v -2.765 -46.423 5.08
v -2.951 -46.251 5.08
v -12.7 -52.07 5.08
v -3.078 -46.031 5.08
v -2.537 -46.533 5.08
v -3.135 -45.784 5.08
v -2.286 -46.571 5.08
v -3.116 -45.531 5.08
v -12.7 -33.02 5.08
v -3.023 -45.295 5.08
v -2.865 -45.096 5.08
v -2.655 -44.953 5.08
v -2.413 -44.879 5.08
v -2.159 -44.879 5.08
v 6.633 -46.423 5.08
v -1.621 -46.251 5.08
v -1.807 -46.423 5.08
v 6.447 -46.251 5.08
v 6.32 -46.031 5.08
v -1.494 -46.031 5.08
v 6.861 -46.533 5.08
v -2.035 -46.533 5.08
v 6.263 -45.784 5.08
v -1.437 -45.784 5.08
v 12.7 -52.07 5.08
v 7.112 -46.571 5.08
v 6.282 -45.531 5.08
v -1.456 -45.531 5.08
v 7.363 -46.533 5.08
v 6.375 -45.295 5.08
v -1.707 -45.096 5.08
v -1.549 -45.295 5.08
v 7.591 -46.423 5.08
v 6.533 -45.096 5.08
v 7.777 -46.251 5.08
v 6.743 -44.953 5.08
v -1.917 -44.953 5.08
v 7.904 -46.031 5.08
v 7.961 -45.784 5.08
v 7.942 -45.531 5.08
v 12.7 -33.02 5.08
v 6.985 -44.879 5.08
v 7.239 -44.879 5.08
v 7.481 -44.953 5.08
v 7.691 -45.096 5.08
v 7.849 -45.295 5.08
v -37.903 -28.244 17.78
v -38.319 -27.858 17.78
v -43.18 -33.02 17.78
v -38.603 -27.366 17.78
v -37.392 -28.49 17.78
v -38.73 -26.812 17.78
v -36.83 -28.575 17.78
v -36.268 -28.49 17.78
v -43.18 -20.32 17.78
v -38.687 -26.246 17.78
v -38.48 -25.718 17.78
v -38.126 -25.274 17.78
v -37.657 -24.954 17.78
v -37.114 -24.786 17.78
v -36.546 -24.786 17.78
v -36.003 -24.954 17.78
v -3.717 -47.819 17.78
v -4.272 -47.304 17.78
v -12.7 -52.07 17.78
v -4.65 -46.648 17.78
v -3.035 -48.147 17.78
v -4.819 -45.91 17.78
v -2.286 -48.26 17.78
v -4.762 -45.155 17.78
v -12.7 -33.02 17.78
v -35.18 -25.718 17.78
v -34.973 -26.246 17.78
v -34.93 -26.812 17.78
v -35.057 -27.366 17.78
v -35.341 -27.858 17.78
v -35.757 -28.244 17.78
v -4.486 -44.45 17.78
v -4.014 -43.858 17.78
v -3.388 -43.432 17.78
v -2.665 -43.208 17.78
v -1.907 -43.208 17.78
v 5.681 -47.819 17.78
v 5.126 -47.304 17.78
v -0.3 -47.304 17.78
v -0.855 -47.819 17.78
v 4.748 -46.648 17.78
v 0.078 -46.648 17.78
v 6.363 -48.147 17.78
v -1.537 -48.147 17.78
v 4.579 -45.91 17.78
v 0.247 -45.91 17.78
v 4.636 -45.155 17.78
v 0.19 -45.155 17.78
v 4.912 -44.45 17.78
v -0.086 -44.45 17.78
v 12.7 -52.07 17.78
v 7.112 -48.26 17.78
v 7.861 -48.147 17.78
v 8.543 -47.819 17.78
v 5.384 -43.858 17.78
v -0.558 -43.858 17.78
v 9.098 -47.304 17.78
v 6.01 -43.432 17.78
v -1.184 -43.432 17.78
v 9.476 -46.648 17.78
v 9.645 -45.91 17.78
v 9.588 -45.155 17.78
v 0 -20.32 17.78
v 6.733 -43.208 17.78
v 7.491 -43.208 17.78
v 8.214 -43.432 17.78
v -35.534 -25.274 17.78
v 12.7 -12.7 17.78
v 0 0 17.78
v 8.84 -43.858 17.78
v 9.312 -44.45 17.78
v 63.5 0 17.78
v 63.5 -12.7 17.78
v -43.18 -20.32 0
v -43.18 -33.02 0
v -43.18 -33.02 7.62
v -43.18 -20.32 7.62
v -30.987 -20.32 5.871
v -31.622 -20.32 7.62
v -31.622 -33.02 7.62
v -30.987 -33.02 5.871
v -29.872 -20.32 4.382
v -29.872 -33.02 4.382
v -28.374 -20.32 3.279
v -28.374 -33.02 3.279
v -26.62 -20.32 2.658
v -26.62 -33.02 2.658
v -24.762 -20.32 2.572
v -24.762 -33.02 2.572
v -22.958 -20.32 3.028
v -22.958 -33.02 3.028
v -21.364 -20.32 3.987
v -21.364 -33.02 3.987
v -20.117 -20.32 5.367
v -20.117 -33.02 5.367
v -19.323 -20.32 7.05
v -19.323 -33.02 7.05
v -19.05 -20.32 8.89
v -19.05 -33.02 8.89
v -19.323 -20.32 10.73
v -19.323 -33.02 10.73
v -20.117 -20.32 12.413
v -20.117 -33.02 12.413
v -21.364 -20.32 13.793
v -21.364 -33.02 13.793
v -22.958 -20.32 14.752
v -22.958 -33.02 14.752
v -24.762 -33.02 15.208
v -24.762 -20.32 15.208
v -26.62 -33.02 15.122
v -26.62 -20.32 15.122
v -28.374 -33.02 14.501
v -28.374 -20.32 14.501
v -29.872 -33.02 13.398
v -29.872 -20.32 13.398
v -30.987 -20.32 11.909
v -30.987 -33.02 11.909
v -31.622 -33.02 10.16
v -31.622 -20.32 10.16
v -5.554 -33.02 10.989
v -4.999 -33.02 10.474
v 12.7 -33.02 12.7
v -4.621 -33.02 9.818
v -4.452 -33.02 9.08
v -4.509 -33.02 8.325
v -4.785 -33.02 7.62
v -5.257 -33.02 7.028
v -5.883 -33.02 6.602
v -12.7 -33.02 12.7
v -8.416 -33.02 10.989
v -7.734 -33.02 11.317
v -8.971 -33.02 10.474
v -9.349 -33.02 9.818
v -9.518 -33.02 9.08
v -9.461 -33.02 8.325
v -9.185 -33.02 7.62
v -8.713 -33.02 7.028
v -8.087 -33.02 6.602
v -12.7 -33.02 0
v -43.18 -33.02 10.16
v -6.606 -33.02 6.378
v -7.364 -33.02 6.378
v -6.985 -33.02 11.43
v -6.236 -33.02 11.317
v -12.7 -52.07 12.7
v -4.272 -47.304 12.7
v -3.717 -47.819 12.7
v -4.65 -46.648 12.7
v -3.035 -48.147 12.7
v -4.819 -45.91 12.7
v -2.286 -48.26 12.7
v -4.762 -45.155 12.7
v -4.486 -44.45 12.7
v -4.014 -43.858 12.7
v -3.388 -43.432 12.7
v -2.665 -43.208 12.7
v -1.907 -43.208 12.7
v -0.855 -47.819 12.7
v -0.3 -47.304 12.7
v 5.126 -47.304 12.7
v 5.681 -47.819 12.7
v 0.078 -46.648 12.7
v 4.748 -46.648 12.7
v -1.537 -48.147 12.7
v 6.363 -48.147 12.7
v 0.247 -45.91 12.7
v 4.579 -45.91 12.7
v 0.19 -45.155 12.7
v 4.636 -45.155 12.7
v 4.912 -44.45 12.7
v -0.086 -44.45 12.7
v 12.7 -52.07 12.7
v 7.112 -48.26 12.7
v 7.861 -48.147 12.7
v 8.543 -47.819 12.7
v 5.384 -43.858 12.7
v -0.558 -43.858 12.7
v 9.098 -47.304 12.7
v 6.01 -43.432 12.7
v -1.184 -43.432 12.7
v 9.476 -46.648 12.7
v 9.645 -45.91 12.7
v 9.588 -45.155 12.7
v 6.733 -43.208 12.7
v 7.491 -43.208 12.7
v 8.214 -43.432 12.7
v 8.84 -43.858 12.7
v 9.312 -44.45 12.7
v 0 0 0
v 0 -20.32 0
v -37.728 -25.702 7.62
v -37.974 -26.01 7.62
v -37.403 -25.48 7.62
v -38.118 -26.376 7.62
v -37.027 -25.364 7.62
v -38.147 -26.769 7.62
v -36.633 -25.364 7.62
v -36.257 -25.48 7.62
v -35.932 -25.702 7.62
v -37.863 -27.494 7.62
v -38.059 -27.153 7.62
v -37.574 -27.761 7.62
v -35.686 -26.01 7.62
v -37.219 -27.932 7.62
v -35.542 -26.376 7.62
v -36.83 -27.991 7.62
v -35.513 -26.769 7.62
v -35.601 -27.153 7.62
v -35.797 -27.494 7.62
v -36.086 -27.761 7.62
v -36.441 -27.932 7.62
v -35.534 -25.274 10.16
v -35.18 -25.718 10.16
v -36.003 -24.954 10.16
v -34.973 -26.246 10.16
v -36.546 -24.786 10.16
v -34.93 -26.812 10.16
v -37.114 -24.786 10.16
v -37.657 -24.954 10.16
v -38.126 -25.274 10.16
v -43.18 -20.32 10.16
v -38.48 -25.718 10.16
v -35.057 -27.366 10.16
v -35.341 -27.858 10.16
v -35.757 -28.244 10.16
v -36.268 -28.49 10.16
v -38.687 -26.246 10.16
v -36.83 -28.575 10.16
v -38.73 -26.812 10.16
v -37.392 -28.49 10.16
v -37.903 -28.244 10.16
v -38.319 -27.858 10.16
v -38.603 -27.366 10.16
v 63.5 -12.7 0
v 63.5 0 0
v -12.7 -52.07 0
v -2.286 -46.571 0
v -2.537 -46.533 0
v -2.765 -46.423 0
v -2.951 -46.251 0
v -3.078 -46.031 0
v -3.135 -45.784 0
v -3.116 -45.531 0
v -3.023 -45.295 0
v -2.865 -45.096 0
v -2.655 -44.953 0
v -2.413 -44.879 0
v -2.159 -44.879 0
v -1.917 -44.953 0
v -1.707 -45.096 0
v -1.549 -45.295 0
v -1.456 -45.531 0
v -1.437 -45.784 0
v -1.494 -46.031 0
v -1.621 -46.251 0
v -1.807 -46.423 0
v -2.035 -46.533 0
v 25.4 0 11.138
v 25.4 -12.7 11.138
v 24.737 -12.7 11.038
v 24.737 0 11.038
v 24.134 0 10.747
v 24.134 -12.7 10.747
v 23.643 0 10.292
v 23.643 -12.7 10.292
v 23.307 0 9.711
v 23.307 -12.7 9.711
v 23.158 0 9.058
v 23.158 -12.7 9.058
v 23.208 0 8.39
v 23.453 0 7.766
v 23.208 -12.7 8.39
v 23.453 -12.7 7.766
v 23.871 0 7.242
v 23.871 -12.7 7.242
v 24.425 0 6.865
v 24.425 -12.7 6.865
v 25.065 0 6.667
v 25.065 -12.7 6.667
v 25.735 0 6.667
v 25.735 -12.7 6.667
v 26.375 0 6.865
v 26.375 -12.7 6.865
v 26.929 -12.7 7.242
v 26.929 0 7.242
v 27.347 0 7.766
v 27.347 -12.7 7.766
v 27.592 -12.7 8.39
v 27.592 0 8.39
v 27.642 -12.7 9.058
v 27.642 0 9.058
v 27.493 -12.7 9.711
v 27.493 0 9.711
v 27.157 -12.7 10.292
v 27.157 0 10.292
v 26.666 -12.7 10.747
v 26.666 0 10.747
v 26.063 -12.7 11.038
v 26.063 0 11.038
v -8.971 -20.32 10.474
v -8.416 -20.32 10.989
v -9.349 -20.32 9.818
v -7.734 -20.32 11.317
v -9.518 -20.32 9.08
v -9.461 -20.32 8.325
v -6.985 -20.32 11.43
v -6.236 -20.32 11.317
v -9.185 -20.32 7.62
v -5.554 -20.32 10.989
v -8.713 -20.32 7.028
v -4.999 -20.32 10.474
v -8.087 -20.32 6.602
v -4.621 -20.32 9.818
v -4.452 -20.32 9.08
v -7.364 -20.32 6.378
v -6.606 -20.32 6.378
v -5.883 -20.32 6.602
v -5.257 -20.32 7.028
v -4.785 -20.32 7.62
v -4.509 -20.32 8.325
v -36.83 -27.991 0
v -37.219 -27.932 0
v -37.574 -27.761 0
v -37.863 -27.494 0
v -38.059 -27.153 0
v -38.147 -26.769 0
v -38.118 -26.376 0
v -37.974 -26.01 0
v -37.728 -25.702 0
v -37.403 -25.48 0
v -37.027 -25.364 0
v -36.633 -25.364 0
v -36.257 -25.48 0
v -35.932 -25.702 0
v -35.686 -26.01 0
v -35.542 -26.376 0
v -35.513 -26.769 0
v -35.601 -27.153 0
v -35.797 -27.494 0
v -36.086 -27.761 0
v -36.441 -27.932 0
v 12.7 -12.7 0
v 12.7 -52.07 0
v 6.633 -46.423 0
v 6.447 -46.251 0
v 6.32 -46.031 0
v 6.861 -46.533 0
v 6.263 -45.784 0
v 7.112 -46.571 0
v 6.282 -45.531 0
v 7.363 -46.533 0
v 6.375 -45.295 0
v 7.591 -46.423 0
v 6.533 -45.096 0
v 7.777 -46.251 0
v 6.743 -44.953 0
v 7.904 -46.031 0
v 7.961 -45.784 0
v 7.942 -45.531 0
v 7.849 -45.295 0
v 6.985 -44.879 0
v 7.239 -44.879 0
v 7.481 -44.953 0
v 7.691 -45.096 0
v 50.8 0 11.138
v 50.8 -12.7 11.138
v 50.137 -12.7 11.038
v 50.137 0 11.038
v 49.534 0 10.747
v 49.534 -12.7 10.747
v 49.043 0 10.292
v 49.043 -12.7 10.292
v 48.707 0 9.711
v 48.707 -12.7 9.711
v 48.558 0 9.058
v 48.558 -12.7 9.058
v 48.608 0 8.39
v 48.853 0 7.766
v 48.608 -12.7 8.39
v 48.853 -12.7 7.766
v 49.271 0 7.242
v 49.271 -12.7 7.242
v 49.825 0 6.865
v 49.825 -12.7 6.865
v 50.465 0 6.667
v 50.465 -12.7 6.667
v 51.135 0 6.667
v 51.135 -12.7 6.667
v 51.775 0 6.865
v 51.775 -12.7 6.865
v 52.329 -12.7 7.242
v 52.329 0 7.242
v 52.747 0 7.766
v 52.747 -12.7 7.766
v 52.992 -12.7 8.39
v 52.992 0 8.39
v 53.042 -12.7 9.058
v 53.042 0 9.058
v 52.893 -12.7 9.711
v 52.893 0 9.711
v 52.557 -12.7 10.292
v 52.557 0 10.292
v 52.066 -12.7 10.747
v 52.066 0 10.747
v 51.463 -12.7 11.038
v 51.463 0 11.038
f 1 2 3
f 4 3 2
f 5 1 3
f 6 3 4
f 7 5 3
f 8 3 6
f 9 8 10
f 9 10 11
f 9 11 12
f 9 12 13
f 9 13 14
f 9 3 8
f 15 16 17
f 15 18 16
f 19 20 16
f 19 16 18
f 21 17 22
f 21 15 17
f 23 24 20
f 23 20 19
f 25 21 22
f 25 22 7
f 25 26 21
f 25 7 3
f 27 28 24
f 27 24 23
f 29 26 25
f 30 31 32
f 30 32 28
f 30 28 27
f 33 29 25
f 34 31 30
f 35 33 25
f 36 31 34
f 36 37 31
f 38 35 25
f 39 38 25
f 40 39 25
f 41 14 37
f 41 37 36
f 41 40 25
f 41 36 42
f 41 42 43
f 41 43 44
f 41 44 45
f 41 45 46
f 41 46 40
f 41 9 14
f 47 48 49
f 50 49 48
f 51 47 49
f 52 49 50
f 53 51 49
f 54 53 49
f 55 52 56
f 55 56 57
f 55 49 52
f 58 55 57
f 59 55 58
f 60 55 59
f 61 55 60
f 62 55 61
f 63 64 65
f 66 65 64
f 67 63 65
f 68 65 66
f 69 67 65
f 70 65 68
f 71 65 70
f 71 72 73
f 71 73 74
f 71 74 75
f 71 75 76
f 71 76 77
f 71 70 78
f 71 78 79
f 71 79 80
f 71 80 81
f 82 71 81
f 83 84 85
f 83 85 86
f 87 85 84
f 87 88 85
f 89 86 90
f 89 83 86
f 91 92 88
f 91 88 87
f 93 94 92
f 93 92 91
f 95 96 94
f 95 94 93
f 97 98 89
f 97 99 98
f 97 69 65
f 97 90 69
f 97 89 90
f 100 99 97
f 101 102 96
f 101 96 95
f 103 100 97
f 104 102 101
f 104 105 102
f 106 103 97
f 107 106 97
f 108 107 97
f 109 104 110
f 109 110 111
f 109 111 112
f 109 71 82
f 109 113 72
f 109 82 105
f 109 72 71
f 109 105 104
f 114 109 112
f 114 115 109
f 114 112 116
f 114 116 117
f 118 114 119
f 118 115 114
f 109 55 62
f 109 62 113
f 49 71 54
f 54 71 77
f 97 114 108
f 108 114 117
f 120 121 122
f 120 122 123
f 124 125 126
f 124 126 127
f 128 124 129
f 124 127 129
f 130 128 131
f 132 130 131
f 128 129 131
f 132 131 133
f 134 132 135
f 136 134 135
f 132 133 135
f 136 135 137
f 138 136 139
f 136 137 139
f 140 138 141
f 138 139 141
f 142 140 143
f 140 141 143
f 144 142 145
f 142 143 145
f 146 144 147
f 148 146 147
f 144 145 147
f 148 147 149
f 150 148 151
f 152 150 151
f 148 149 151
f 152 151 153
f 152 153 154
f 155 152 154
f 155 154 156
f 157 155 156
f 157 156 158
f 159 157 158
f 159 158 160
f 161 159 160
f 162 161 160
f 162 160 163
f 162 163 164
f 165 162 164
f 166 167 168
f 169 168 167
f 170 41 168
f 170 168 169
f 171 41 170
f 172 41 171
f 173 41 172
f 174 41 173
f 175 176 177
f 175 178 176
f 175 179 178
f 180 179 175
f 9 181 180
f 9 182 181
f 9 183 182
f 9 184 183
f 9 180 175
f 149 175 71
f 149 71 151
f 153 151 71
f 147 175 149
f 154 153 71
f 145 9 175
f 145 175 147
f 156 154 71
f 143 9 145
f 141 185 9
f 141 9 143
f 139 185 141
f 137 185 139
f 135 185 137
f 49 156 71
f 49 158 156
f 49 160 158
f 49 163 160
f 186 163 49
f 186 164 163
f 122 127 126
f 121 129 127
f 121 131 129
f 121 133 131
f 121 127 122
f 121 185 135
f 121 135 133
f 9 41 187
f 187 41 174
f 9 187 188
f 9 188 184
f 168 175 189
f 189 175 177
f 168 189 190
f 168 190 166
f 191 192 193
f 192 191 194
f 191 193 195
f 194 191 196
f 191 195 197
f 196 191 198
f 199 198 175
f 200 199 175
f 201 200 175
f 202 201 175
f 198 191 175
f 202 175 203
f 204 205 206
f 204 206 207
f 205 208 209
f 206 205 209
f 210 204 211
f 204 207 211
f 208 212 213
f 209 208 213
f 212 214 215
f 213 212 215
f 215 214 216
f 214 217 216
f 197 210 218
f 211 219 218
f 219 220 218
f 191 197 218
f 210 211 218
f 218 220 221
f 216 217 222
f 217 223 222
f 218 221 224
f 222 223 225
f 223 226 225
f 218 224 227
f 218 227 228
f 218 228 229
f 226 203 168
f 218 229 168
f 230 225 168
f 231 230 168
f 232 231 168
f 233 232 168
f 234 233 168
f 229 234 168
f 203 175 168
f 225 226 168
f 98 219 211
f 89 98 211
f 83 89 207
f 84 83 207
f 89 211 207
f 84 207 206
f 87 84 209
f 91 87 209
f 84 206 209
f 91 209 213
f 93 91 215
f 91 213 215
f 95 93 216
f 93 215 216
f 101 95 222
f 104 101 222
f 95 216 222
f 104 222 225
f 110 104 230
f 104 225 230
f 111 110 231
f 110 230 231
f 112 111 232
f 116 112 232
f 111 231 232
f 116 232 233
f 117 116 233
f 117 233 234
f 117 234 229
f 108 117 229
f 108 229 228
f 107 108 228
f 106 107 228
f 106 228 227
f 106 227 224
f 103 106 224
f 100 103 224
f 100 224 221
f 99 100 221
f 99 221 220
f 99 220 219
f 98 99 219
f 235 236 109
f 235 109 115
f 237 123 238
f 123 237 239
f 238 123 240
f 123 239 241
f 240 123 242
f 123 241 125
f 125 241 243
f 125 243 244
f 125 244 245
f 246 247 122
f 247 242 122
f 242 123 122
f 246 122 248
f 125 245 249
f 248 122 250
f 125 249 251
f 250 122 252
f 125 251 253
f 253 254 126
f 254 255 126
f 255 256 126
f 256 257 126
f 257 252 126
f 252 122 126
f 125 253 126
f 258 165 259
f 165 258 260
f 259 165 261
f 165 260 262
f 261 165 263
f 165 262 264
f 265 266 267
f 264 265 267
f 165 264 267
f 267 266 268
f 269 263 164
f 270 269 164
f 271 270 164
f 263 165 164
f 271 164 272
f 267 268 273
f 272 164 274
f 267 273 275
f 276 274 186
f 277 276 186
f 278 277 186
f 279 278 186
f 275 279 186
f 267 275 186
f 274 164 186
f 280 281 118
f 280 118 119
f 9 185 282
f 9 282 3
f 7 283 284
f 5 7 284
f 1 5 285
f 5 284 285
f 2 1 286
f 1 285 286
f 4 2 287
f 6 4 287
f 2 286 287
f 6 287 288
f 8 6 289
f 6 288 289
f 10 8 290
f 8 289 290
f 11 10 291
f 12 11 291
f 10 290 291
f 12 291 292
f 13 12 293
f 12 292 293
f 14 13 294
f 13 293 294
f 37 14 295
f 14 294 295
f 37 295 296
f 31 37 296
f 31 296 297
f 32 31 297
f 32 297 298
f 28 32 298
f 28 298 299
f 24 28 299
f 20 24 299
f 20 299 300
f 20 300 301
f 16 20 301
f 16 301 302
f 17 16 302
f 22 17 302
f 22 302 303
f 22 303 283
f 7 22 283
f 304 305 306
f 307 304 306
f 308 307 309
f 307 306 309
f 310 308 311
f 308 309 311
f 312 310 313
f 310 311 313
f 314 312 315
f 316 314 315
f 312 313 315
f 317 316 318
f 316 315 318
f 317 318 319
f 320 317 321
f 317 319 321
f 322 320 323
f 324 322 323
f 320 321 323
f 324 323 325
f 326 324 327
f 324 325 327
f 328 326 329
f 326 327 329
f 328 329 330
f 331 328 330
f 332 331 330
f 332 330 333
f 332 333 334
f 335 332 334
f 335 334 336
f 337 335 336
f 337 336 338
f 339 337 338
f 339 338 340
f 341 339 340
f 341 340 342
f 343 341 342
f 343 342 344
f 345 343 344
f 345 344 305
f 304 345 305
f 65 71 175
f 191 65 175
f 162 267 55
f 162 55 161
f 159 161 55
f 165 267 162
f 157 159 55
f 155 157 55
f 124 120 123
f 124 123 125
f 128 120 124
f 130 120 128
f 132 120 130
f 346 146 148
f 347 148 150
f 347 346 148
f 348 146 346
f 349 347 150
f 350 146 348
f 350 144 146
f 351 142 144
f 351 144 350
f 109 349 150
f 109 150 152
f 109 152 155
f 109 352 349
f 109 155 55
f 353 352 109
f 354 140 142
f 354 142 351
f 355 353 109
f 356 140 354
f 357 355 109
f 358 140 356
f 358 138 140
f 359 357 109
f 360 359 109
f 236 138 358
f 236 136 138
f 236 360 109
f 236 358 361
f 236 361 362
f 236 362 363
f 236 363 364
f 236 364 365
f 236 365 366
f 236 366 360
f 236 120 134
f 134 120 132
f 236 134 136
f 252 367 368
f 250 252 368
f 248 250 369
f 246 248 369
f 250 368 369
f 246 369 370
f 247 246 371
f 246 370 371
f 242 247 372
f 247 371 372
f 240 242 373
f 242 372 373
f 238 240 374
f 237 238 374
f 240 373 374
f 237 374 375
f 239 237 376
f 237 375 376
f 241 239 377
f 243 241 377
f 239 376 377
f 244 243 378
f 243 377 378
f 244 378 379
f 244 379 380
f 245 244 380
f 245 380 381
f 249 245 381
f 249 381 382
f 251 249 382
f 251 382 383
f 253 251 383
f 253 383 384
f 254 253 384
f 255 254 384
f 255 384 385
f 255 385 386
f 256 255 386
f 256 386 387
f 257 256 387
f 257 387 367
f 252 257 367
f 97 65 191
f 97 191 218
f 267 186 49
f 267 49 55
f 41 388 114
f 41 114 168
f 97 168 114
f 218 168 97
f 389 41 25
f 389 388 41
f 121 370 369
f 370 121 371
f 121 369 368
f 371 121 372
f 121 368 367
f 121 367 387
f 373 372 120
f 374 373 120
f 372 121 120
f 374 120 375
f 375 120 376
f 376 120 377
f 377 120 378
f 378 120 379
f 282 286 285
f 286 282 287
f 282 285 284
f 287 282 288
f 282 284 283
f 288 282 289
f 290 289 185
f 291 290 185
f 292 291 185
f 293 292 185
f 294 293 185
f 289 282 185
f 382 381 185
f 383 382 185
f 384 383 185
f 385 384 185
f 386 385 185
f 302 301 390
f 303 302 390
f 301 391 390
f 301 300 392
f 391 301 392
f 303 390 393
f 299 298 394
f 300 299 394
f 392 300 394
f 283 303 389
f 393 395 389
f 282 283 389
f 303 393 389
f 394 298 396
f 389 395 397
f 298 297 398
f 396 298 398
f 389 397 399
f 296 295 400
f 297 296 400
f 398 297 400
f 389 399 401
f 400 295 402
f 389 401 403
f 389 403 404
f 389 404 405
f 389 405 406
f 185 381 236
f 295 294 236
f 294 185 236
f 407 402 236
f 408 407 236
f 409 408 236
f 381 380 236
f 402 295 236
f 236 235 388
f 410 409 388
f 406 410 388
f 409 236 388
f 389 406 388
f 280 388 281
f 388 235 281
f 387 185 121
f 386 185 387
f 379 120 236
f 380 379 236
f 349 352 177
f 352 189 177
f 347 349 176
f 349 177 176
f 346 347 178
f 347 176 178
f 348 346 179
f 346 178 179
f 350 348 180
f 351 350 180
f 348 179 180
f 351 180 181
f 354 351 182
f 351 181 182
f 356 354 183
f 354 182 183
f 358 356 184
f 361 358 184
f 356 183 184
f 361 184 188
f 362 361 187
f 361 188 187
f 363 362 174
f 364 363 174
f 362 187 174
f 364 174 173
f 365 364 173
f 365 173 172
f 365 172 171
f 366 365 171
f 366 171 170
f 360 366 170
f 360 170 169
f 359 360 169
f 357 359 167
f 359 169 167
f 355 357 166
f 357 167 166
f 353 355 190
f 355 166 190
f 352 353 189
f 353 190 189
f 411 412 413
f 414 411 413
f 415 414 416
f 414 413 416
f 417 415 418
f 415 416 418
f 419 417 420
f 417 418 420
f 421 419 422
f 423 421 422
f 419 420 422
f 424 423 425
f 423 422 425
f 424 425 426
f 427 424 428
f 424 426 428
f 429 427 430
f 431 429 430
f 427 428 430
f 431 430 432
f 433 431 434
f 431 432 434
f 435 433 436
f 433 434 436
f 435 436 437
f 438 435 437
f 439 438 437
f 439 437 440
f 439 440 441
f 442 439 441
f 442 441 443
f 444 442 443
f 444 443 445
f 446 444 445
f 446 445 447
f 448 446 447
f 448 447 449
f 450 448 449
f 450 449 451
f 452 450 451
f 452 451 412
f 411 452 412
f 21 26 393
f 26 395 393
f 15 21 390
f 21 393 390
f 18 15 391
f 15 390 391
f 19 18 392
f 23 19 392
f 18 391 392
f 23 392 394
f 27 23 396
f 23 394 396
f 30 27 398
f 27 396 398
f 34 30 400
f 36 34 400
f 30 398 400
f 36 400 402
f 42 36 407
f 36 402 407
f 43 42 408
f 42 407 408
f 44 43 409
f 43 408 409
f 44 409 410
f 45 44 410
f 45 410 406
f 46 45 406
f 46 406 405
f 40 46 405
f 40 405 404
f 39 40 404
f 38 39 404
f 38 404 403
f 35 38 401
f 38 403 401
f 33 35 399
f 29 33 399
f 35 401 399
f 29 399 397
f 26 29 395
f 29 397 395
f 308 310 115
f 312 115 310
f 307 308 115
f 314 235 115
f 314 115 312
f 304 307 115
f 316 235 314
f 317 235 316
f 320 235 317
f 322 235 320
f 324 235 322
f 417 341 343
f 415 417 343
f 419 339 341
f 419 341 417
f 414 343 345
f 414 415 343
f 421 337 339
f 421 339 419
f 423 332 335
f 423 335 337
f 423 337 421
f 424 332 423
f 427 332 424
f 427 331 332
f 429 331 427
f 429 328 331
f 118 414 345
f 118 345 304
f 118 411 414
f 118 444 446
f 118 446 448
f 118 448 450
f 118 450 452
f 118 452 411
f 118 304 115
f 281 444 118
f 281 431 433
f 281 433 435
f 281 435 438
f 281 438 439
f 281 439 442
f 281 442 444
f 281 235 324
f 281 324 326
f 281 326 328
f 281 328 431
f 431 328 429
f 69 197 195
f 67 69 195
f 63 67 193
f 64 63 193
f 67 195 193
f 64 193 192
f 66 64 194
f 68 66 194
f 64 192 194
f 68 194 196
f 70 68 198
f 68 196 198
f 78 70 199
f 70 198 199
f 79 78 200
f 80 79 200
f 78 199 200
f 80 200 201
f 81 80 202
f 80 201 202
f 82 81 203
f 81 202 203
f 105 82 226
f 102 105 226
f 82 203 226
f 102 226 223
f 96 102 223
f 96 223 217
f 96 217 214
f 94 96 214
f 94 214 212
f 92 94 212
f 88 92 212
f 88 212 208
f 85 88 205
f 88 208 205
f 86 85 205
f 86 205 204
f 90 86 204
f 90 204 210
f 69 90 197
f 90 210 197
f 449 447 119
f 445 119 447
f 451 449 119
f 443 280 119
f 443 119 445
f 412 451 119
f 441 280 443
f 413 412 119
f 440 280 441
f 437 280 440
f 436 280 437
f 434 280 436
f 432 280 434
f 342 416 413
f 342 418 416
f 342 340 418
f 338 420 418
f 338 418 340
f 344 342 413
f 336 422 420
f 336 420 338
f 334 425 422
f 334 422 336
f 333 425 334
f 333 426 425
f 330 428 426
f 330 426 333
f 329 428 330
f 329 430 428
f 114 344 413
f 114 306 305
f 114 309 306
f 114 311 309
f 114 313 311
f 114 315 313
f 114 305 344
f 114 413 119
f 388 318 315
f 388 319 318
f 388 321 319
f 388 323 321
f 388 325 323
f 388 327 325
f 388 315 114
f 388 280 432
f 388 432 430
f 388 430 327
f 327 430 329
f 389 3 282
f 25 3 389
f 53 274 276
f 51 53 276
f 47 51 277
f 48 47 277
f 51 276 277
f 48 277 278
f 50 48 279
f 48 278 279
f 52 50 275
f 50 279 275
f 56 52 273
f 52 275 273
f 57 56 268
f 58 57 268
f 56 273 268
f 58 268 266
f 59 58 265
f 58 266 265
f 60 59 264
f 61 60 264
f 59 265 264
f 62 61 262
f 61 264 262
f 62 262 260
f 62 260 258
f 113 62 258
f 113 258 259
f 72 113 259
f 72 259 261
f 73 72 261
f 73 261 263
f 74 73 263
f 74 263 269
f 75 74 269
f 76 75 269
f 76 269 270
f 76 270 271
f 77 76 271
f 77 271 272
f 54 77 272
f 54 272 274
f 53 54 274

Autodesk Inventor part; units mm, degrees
ref_plane "YZ Plane" through (0, 0, 0) normal (1, 0, 0) x (0, 1, 0)
ref_plane "XZ Plane" through (0, 0, 0) normal (0, 1, 0) x (-1, 0, 0)
ref_plane "XY Plane" through (0, 0, 0) normal (0, 0, 1) x (1, 0, 0)
sketch "Sketch1" plane through (0, 0, 0) normal (0, 0, 1) x (1, 0, 0)
  line L0 (0, 0) -> (63.5, 0)
  line L1 (63.5, 0) -> (63.5, -12.7)
  line L2 (63.5, -12.7) -> (12.7, -12.7)
  line L3 (12.7, -12.7) -> (12.7, -33.02)
  line L4 (12.7, -33.02) -> (-43.18, -33.02)
  line L5 (-43.18, -33.02) -> (-43.18, -20.32)
  line L6 (-43.18, -20.32) -> (0, -20.32)
  line L7 (0, -20.32) -> (0, 0)
  dimension "d0" = 12.7
  dimension "d2" = 12.7
  dimension "d3" = 12.7
  dimension "d4" = 43.18
  dimension "d5" = 20.32
  dimension "d22" = 50.8
extrude "Extrusion1" add sketch "Sketch1" along normal blind 17.78
sketch "Sketch2" plane through (0, 0, 0) normal (0, 1, 0) x (1, 0, 0)
  line L0 (63.5, 0) -> (63.5, -17.78) projected
  line L1 (0, 0) -> (0, -17.78) projected
  line L2 (0, -8.89) -> (63.5, -8.89) construction
  point P0 (50.8, -8.89)
  point P1 (25.4, -8.89)
  dimension "d8" = 12.7
  dimension "d9" = 25.4
hole "Hole1" at (50.8, 0, 8.89) at (25.4, 0, 8.89) direction (0, -1, 0) diameter 4.4958 end through all clearance for "Flat Head Machine Screw (82)" size "#8" standard "Ansi Unified Screw Threads"
sketch "Sketch3" plane through (-43.18, -33.02, 0) normal (0, -1, 0) x (1, 0, 0)
  line L0 (0, 0) -> (0, 17.78) projected
  line L1 (55.88, 0) -> (55.88, 17.78) projected
  line L2 (0, 8.89) -> (55.88, 8.89) construction
  arc A0 (11.5583, 7.62) -> (11.5583, 10.16) centre (17.78, 8.89) ccw
  line L3 (11.5583, 10.16) -> (0, 10.16)
  line L4 (0, 7.62) -> (11.5583, 7.62)
  line L5 (0, 10.16) -> (0, 7.62)
  point P0 (43.18, 0)
  dimension "d17" = 12.7
  dimension "d18" = 17.78
  dimension "d19" = 2.54
extrude "Extrusion2" cut sketch "Sketch3" against normal up to next
sketch "Sketch4" plane through (0, 0, 17.78) normal (0, 0, 1) x (1, 0, 0)
  line L0 (-43.18, -33.02) -> (-43.18, -20.32) projected
  line L1 (12.7, -12.7) -> (12.7, -33.02) projected
  line L2 (-43.18, -26.67) -> (12.7, -26.67) construction
  point P0 (-36.83, -26.67)
  dimension "d23" = 6.35
hole "Hole3" at (-36.83, -26.67, 17.78) direction (0, 0, -1) diameter 3.81 end up to surface clearance for "Flat Head Machine Screw (82)" size "#6" standard "Ansi Unified Screw Threads"
hole "Hole4" at (-36.83, -26.67, 17.78) direction (0, 0, -1) diameter 2.6416 end through all thread size "6-32 UNC" class "2B" standard "ANSI Unified Screw Threads"
sketch "Sketch6" plane through (-43.18, -33.02, 0) normal (0, -1, 0) x (1, 0, 0)
  line L0 (0, 10.16) -> (11.5583, 10.16) projected
  arc A0 (11.5583, 7.62) -> (11.5583, 10.16) centre (17.78, 8.89) ccw projected
  line L1 (11.5583, 7.62) -> (0, 7.62) projected
  line L2 (0, 0) -> (0, 7.62) projected
  line L3 (55.88, 0) -> (0, 0) projected
  line L4 (55.88, 0) -> (55.88, 17.78) projected
  line L5 (55.88, 17.78) -> (0, 17.78) projected
  line L6 (0, 10.16) -> (0, 17.78) projected
  line L7 (55.88, 17.78) -> (30.48, 17.78)
  line L8 (30.48, 17.78) -> (30.48, 12.7)
  line L9 (30.48, 12.7) -> (55.88, 12.7)
  line L10 (55.88, 12.7) -> (55.88, 17.78)
  line L11 (55.88, 0) -> (30.48, 0)
  line L12 (30.48, 0) -> (30.48, 5.08)
  line L13 (30.48, 5.08) -> (55.88, 5.08)
  line L14 (55.88, 5.08) -> (55.88, 0)
  point P0 (43.18, 0)
  dimension "d56" = 5.08
  dimension "d57" = 25.4
  dimension "d58" = 5.08
  dimension "d59" = 25.4
extrude "Extrusion3" add sketch "Sketch6" along normal blind 19.05 contours L5 L4 L9 L8 | L12 L13 L4 L3
sketch "Sketch8" plane through (0, 0, 17.78) normal (0, 0, 1) x (1, 0, 0)
  line L0 (-12.7, -33.02) -> (-43.18, -33.02) projected
  line L1 (12.7, -12.7) -> (12.7, -52.07) projected
  point P0 (0, 0)
  point P1 (7.112, -45.72)
  point P2 (-2.286, -45.72)
  dimension "d66" = 12.7
  dimension "d67" = 12.7
  dimension "d68" = 14.986
  dimension "d69" = 9.398
hole "Hole6" at (7.112, -45.72, 17.78) at (-2.286, -45.72, 17.78) direction (0, 0, -1) diameter 5.08 end up to surface
hole "Hole7" at (-2.286, -45.72, 17.78) direction (0, 0, -1) diameter 1.7018 end through all
hole "Hole8" at (7.112, -45.72, 17.78) direction (0, 0, -1) diameter 1.7018 end through all
sketch "Sketch9" plane through (-43.18, -20.32, 0) normal (0, 1, 0) x (1, 0, 0)
  line L0 (11.5583, -10.16) -> (0, -10.16) projected
  line L1 (0, -10.16) -> (0, -17.78) projected
  line L2 (0, -17.78) -> (43.18, -17.78) projected
  line L3 (43.18, 0) -> (43.18, -17.78) projected
  line L4 (0, 0) -> (43.18, 0) projected
  line L5 (0, 0) -> (0, -7.62) projected
  line L6 (0, -7.62) -> (11.5583, -7.62) projected
  arc A0 (11.5583, -10.16) -> (11.5583, -7.62) centre (17.78, -8.89) ccw projected
  point P0 (36.195, -8.89)
  dimension "d95" = 18.415
hole "Hole9" at (-6.985, -20.32, 8.89) direction (0, -1, 0) diameter 5.08 end through all
equation "\"d67\" = d66"
properties part number "J001396" material "ALUMINUM, 6061-T651"
